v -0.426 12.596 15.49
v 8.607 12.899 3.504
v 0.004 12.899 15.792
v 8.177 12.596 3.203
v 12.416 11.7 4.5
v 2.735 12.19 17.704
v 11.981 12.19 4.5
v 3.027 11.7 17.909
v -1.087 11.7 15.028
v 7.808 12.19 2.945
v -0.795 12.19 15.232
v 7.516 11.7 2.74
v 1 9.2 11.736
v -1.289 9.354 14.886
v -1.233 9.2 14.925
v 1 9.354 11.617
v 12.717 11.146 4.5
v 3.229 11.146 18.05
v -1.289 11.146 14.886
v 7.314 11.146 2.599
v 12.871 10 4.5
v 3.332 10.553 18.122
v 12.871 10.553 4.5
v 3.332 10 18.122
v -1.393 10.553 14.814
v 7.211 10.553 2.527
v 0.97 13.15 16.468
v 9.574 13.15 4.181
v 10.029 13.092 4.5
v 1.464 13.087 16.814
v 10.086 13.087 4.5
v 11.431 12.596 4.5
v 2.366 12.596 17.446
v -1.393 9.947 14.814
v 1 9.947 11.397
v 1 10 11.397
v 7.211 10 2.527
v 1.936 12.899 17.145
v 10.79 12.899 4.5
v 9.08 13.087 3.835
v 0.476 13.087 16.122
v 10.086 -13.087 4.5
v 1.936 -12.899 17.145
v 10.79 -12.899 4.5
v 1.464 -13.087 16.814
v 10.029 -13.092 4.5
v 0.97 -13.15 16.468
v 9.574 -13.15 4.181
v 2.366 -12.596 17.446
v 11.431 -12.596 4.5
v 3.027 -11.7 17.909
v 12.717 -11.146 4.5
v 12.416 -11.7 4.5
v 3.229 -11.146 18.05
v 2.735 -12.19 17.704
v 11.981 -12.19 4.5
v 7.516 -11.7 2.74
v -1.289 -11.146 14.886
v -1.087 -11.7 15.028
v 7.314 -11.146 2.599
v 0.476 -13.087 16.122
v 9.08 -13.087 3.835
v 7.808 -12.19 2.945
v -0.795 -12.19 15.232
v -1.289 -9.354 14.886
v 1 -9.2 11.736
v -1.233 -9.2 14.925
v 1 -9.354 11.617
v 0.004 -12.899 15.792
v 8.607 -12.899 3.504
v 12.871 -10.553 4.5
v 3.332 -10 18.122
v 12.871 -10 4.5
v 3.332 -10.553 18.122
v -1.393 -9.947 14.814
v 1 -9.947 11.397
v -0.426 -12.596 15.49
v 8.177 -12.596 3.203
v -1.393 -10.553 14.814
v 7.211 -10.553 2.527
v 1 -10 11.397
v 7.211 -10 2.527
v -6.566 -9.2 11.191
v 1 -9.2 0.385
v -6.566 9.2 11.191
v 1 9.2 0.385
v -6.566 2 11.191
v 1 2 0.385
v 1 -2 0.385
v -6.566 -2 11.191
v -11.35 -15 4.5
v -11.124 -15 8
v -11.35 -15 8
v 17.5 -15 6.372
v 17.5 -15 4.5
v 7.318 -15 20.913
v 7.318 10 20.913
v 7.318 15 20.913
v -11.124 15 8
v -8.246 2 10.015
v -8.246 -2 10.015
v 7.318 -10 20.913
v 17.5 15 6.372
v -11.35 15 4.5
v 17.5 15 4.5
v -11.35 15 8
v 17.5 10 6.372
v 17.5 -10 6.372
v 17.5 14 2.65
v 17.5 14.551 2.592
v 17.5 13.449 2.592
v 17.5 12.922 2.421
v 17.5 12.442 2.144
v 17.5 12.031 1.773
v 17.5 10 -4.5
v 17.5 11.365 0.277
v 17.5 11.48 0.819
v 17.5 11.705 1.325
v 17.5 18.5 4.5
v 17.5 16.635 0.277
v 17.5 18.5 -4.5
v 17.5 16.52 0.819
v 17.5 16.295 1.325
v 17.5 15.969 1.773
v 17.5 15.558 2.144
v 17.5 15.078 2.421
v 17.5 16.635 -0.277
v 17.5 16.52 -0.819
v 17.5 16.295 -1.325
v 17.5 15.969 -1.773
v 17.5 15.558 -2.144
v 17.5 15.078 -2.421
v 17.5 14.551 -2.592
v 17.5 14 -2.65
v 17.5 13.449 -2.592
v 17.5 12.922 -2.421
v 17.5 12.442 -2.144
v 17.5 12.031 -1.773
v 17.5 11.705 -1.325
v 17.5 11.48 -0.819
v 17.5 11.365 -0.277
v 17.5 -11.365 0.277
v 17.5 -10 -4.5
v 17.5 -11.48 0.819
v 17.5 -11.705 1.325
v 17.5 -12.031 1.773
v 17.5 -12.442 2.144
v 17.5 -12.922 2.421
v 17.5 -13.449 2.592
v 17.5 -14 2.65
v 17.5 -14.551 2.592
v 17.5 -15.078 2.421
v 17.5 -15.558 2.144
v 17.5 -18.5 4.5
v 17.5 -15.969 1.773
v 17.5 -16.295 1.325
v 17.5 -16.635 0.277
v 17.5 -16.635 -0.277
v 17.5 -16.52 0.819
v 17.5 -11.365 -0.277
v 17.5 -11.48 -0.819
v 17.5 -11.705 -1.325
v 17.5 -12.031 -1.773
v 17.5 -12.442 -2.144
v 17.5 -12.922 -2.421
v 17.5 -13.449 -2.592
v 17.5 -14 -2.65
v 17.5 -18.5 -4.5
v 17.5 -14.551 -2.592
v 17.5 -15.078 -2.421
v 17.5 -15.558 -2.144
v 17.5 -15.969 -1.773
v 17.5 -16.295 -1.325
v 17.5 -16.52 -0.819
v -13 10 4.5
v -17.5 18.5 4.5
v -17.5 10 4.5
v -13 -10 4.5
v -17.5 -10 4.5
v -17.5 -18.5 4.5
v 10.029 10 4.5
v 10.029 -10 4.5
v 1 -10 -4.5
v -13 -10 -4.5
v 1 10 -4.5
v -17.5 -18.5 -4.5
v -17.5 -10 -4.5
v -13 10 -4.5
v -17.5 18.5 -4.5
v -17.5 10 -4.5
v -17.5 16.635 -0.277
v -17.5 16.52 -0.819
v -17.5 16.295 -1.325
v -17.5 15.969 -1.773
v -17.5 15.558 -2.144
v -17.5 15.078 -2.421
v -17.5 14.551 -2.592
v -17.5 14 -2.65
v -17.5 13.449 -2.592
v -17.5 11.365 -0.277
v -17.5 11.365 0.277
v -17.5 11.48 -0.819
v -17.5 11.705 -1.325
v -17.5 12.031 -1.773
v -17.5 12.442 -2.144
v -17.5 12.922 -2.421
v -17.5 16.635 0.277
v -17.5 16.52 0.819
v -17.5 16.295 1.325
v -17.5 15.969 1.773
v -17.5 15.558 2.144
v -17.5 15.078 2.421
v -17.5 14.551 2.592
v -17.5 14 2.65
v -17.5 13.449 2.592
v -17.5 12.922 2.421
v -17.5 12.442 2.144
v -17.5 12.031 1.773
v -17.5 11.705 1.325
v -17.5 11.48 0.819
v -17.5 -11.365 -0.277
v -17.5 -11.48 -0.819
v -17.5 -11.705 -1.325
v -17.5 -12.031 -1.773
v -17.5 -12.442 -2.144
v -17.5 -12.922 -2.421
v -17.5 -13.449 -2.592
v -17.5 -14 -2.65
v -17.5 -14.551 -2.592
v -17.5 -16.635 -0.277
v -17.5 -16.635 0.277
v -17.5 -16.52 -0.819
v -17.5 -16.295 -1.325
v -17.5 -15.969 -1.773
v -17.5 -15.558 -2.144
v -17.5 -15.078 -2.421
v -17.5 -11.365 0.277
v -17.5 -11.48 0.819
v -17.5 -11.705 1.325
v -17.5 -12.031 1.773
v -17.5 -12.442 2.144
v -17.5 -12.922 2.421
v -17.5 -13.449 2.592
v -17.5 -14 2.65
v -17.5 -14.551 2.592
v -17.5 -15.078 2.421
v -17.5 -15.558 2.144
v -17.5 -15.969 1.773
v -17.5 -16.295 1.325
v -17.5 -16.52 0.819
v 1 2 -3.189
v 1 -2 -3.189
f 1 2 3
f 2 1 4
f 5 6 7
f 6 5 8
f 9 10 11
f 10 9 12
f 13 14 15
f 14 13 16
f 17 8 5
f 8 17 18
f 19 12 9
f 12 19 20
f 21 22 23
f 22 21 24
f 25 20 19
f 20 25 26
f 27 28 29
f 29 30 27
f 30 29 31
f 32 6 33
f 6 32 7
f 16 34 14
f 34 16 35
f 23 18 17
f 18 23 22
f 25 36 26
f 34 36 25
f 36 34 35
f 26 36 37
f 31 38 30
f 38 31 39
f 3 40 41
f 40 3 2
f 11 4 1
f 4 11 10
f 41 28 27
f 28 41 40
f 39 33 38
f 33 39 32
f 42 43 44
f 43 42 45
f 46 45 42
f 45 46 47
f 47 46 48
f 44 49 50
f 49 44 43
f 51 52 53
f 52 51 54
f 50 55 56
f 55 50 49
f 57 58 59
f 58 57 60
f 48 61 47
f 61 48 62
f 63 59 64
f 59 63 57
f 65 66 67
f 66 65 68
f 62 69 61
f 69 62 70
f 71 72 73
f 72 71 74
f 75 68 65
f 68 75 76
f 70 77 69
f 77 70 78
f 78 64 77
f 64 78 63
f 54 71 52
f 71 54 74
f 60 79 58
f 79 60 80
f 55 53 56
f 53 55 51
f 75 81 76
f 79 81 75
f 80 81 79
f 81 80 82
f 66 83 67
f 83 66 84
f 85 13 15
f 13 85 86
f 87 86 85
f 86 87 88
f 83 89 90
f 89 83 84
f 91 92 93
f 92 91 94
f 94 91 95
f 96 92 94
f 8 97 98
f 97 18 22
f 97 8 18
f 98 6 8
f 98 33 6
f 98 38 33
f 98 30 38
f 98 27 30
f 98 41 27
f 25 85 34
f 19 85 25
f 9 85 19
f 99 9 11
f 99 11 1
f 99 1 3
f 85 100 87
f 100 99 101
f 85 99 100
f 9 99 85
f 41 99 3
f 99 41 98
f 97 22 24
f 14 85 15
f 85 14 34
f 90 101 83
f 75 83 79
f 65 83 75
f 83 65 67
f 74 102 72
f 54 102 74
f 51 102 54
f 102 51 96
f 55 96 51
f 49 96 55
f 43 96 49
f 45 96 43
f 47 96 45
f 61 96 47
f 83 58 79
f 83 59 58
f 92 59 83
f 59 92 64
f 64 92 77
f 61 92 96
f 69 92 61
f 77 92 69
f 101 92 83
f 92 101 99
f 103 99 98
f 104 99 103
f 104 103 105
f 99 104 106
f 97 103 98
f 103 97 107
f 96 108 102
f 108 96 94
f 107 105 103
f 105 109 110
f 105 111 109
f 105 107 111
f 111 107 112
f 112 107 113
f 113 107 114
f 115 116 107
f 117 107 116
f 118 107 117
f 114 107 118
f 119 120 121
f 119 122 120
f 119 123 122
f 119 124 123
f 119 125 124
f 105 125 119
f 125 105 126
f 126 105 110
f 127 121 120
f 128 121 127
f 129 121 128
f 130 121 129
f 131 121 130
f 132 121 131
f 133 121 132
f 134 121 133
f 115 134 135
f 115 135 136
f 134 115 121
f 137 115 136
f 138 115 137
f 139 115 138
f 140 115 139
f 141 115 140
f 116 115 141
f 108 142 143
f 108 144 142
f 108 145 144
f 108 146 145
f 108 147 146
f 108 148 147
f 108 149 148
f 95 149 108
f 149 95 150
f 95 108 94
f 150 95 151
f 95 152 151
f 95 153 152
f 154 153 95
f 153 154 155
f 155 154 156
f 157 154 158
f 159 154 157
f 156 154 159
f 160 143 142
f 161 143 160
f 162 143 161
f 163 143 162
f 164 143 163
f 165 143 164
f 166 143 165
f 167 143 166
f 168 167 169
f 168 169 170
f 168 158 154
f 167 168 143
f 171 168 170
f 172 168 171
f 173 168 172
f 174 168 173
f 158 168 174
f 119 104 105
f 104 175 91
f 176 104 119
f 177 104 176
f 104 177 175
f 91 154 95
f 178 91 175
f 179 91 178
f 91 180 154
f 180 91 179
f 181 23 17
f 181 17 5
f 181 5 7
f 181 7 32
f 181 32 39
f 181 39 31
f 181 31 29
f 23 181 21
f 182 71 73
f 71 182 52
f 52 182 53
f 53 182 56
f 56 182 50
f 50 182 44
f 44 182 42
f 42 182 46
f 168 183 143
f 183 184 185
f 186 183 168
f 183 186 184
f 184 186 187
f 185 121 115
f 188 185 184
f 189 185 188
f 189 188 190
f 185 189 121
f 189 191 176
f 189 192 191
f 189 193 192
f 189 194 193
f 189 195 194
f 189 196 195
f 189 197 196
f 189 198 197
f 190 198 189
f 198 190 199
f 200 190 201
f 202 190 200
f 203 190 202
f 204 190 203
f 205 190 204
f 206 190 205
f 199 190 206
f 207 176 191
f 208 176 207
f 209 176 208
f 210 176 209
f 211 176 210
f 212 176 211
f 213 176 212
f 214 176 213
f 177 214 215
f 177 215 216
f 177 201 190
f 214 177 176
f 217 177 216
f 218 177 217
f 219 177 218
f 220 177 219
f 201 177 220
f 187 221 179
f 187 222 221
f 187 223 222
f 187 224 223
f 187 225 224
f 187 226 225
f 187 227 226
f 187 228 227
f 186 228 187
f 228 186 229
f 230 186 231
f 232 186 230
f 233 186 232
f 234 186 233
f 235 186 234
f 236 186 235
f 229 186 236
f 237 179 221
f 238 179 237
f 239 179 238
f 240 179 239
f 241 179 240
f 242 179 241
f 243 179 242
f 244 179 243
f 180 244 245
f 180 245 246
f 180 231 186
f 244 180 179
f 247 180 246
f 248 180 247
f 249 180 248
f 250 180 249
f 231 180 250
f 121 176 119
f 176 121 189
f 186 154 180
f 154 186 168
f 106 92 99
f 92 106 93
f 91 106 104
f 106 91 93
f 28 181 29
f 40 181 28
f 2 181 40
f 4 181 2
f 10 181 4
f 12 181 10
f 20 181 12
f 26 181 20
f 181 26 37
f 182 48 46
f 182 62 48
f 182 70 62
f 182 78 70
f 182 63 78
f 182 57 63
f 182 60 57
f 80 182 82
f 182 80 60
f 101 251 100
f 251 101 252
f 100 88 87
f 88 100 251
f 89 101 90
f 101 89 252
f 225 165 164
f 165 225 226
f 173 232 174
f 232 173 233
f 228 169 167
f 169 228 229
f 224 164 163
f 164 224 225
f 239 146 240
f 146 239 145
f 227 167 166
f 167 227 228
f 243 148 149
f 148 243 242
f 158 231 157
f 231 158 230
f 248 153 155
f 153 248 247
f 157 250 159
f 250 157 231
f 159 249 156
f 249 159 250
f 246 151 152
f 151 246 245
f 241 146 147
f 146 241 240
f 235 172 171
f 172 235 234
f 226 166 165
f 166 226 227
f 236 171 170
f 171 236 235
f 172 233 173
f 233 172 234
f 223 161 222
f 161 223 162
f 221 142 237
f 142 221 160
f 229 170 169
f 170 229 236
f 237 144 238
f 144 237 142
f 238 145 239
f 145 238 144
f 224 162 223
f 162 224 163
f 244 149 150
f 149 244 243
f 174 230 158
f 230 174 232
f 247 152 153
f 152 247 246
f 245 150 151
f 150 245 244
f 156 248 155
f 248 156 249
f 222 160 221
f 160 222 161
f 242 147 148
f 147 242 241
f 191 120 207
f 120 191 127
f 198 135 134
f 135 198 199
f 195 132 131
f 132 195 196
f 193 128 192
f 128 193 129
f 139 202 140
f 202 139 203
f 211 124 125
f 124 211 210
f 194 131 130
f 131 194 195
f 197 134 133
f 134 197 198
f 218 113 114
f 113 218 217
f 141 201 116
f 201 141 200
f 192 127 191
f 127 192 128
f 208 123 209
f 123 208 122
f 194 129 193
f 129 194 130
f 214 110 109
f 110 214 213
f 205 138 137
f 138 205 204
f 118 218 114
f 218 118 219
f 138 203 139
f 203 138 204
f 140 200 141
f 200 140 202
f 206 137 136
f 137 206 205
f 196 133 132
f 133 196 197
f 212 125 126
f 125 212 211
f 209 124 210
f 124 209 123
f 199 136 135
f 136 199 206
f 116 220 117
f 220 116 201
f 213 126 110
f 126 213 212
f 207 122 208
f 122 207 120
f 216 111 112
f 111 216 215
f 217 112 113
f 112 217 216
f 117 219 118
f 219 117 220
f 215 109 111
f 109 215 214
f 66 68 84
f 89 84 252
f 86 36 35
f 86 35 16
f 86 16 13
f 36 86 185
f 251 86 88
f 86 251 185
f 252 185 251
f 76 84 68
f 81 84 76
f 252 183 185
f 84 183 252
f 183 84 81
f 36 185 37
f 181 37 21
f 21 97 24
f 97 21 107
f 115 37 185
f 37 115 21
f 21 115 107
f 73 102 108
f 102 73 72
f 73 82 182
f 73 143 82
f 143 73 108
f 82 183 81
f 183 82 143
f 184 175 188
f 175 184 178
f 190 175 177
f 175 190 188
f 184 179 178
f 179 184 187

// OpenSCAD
// file: dronePlates.scad
/**
 * dronePlates.scad
 * Plate library
 *
 * GNU GPL V3
 * @author: Victor Potenciano
 */

m3Rad = 3.4/2;
cornerR = 4;

/**
 *
 */
module helperDisk(diameter) {
	cylinder(r = diameter/2, h = 0.6, $fn=20);
}

/**
 *
 */
module roundedRect(size, radius) {
	x = size[0];
	y = size[1];
	z = size[2];

	linear_extrude(height=z)
	hull() {
	// place 4 circles in the corners, with the given radius
	translate([(-x/2)+(radius/2), (-y/2)+(radius/2), 0]){ circle(r=radius); }
	translate([(x/2)-(radius/2), (-y/2)+(radius/2), 0]){ circle(r=radius); }
	translate([(-x/2)+(radius/2), (y/2)-(radius/2), 0]){ circle(r=radius); }
	translate([(x/2)-(radius/2), (y/2)-(radius/2), 0]){ circle(r=radius); }
	}
}

/**
 * rounded rectangle triangle with corner at origin
 */
module roundedTriangle(size, radius) {
	x = size[0];
	y = size[1];
	z = size[2];

	linear_extrude(height=z)
	hull() {
	translate([radius, radius, 0]){ circle(r=radius); }
	translate([x-radius, radius, 0]){ circle(r=radius); }
	translate([radius, y-radius, 0]){ circle(r=radius); }
	}
}

/**
 *
 */
module roundRectPlate(w, l, plateThick=3) {
	difference(){
		roundedRect([l+m3Rad*1.75,w+m3Rad*1.75,plateThick], cornerR);
		translate([l/2, w/2, -0.5]) { cylinder(h = plateThick+1, r = m3Rad, $fn=30); }
		translate([-l/2, w/2, -0.5]) { cylinder(h = plateThick+1, r = m3Rad, $fn=30); }
		translate([l/2, -w/2, -0.5]) { cylinder(h = plateThick+1, r = m3Rad, $fn=30); }
		translate([-l/2, -w/2, -0.5]) { cylinder(h = plateThick+1, r = m3Rad, $fn=30); }
	}
}

/**
 *
 */
module crossSquarePlate(l, thick=3) {
	inDist = cornerR*2+4;
	trianL = sqrt((l*l)/2)-inDist;
	centerR = 4;

	difference(){
		roundRectPlate(l, l, thick);
		translate([0, centerR, -0.5]) { 
			rotate([0,0,45]){ roundedTriangle([trianL,trianL,thick+1], cornerR-2); }
		}
		translate([0, -centerR, -0.5]) { 
			rotate([0,0,225]){ roundedTriangle([trianL,trianL,thick+1], cornerR-2); }
		}
		translate([-centerR, 0, -0.5]) { 
			rotate([0,0,135]){ roundedTriangle([trianL,trianL,thick+1], cornerR-2); }
		}
		translate([centerR, 0, -0.5]) { 
			rotate([0,0,-45]){ roundedTriangle([trianL,trianL,thick+1], cornerR-2); }
		}
	}
}

/**
 *
 */
module hShapePlate(w, l, thick=4) {
	inDist = cornerR*2+1;

	difference(){
		roundRectPlate(w, l, thick);
		translate([0, w/4, -0.5]) { roundedRect([l-inDist,w/2-inDist,thick+1], cornerR-2); }
		translate([0, -w/4, -0.5]) { roundedRect([l-inDist,w/2-inDist,thick+1], cornerR-2); }
	}
}

/**
 *
 */
module motorCircleMount(inDia, outDia, thick=3, extraH=false, d1=19, d2=16, holeR=m3Rad ) {
	difference(){
		cylinder(h = thick, r = outDia/2, $fn=30);
		motorCircleMountHoles(inDia, outDia, thick, extraH, d1=d1, d2=d2, holeR=holeR);
	}
}

/**
 *
 */
module motorCircleMountHoles(inDia, outDia, thick=3, extraH=false, d1=19, d2=16, d3=25, holeR=m3Rad) {
	translate([0, 0, -0.5]) { cylinder(h = thick+1, r = inDia/2, $fn=30); }

	for(i=[0:3]) {
		rotate([0,0,90*i]){
		translate([d1/2, 0, -0.5]) cylinder(h = thick+1, r = holeR, $fn=20);
		translate([d2/2, 0, -0.5]) cylinder(h = thick+1, r = holeR, $fn=20);
		translate([d2/2, -holeR, -0.5]) cube(size = [(d1-d2)/2,holeR*2,thick+1]);
		}
	}
	
	if(extraH==true){	
		for(i=[-1,1]) translate([i*d3/2, 0, -0.5]) { cylinder(h = thick+1, r = holeR, $fn=30); }
	}
}

/**
 *
 */
module motorRectMount(w, l, inDia, thick=3) {
	d1=19;
	d2=16;

	difference(){
		roundRectPlate(w, l, thick);
		translate([0, 0, -0.5]) { cylinder(h = thick+1, r = inDia/2, $fn=30); }
		translate([0, d1/2, -0.5]) { cylinder(h = thick+1, r = m3Rad, $fn=30); }
		translate([0, -d1/2, -0.5]) { cylinder(h = thick+1, r = m3Rad, $fn=30); }
		translate([d2/2, 0, -0.5]) { cylinder(h = thick+1, r = m3Rad, $fn=30); }
		translate([-d2/2, 0, -0.5]) { cylinder(h = thick+1, r = m3Rad, $fn=30); }
	}
}

/**
 *
 */
module tube(inDia, outDia, height) {
	difference(){
		cylinder(h = height, r = outDia/2, $fn=50);
		translate([0, 0, -0.5]) { cylinder(h = height+1, r = inDia/2, $fn=30); }
	}
}

/**
 *
 */
module squareTube(inDia, outDia, height) {
	translate([0,0,height/2]){
	difference(){
		cube(size = [outDia,outDia,height], center = true);
		cube(size = [inDia,inDia,height+1], center = true);
	}
	}
}

/**
 *
 */
module djiFlamewheelHoles(height) {
	a = 23;
	b = 16;
	c = 19.5;
	
	translate([a/2, c/2, 0]) { cylinder(h = height, r = m3Rad, $fn=30); }
	translate([-a/2, c/2, 0]) { cylinder(h = height, r = m3Rad, $fn=30); }
	translate([b/2, -c/2, 0]) { cylinder(h = height, r = m3Rad, $fn=30); }
	translate([-b/2, -c/2, 0]) { cylinder(h = height, r = m3Rad, $fn=30); }
}

/**
 *
 */
module djiFlamewheelHolesBotton(height) {
	a1 = 21;
	c = 19.5;
	
	translate([a1/2, c/2, 0]) { cylinder(h = height, r = m3Rad, $fn=30); }
	translate([-a1/2, c/2, 0]) { cylinder(h = height, r = m3Rad, $fn=30); }
}

/**
 *
 */
module propeller(size){
union(){
difference(){
	cylinder(h = 3, r = size/2, center=true, $fn=30);
	cylinder(h = 3.1, r = size/2-2, center=true, $fn=30); 
}
for( i = [-1,1] ){
rotate([0,0,45*i]){ cube(size = [size,4,1], center = true); }
}
}
}

/**
 *
 */
module slot(length, height, rad){
for(i=[-1,1]) translate([i*length/2,0,0]) cylinder(h = height, r = rad, $fn=30);
translate([0,0,height/2]) cube(size = [length,rad*2,height], center = true);
}

 

////////////////////////
// Examples:
////////////////////////

motorCircleMount(8, 25, 3.5);

//roundedRect([50,50,3], 4);

//hShapePlate(79, 25);

//rotate([0,0,45]){roundedTriangle([40,40,3], 4);}

//crossSquarePlate(45, 4);

/*
union(){
motorRectMount(21, 18, 8, 4);
translate([9, 10.5, 0]) {tube(m3Rad*2, 6.5, 6);}
}
*/

/*
difference(){
union(){
hShapePlate(50, 30, 3.5);
translate([-4,-25,0]){cube(size = [8,50,3.5]);}
rotate([0, 0, 45]) {motorCircleMount(8, 35, 3.5);}
}
cylinder(h = 10, r = 4, $fn=100, center=true);
}
*/

//rotate([90,0,0]){ tube(5,10,20); }
//translate([20,0,0]){ squareTube(5, 10, 20); }
// main file
/**
 * lt210 fpv camera mount
 */
 
use <dronePlates.scad>;

thick = 1.5;
hubSqH=28;
tolerance=0.4;
front_cc = 28;
angle=35;

/**
 *
 */
module cameraHub(tolerance=0){
sqL = 18;

translate([0,0,hubSqH/2]) cube(size=[sqL+tolerance,sqL+tolerance,hubSqH+tolerance], center=true);
cylinder(r=7.5+(tolerance/2), h=16, $fn=20);
for(i=[-1,1]) translate([i*10.25,0,0]) cylinder(h=hubSqH,r=2.7+(tolerance/2),$fn=30);
translate([0,0,16/2])cube(size=[3+tolerance,sqL+4+tolerance,16], center=true);
}//end module

/**
 *
 */
module housing(){
difference(){
cube(size=[30,30,hubSqH-2], center=true);
scale([1,1,1.1]) translate([0,0,-hubSqH/2]) cameraHub(tolerance=tolerance);
translate([0,13,0]) cube(size=[32+1,10+0.5,hubSqH], center=true);
}
}//end module

/**
 *
 */
module fpvCam(){
    union(){
    cube([32,32,1.5], center=true);
    translate([0,0,4]) cube([18,18,8], center=true);
    cylinder(r=8.5, h=25, $fn=20);
    }
}

shiftZ= 5;
shiftX=9;
preShZ = -1;
///color("grey") translate([0,0,19]) rotate([0,180-angle,0]) fpvCam();

color(alpha=0.4)
difference(){
    union(){
        cube([35,37,9], center=true);
        translate([shiftX,0,shiftZ])  rotate([0,-angle,0]) translate([0,0,-preShZ]) rotate([0,0,-90]) housing();
        translate([-9.85,0,0])  cube([3,30,16], center=true);
    }
    
    translate([shiftX,0,shiftZ]) rotate([0,-angle,0]) {
    translate([0,0,preShZ]) rotate([0,0,-90]) cameraHub(tolerance=tolerance);
    cylinder(r=8.2, h=60, center=true, $fn=30);
    translate([-9.25,0,0]) cube(size=[4,4,60], center=true);
    }
    
    for(i=[-1,1]){
        translate([0,i*front_cc/2,0]) rotate([0,90,0]) 
            cylinder(r=5.3/2, h=100, $fn=30, center=true);
    }
    
    translate([10,0,0]) cube(size=[18,20,50], center=true);
    translate([35/2+10/2,0,0]) cube(size=[10,40,50], center=true);
    translate([0,0,-9.5]) cube(size=[40,40,10], center=true);
    translate([-18,0,0]) cube(size=[10,20,50], center=true);
}
